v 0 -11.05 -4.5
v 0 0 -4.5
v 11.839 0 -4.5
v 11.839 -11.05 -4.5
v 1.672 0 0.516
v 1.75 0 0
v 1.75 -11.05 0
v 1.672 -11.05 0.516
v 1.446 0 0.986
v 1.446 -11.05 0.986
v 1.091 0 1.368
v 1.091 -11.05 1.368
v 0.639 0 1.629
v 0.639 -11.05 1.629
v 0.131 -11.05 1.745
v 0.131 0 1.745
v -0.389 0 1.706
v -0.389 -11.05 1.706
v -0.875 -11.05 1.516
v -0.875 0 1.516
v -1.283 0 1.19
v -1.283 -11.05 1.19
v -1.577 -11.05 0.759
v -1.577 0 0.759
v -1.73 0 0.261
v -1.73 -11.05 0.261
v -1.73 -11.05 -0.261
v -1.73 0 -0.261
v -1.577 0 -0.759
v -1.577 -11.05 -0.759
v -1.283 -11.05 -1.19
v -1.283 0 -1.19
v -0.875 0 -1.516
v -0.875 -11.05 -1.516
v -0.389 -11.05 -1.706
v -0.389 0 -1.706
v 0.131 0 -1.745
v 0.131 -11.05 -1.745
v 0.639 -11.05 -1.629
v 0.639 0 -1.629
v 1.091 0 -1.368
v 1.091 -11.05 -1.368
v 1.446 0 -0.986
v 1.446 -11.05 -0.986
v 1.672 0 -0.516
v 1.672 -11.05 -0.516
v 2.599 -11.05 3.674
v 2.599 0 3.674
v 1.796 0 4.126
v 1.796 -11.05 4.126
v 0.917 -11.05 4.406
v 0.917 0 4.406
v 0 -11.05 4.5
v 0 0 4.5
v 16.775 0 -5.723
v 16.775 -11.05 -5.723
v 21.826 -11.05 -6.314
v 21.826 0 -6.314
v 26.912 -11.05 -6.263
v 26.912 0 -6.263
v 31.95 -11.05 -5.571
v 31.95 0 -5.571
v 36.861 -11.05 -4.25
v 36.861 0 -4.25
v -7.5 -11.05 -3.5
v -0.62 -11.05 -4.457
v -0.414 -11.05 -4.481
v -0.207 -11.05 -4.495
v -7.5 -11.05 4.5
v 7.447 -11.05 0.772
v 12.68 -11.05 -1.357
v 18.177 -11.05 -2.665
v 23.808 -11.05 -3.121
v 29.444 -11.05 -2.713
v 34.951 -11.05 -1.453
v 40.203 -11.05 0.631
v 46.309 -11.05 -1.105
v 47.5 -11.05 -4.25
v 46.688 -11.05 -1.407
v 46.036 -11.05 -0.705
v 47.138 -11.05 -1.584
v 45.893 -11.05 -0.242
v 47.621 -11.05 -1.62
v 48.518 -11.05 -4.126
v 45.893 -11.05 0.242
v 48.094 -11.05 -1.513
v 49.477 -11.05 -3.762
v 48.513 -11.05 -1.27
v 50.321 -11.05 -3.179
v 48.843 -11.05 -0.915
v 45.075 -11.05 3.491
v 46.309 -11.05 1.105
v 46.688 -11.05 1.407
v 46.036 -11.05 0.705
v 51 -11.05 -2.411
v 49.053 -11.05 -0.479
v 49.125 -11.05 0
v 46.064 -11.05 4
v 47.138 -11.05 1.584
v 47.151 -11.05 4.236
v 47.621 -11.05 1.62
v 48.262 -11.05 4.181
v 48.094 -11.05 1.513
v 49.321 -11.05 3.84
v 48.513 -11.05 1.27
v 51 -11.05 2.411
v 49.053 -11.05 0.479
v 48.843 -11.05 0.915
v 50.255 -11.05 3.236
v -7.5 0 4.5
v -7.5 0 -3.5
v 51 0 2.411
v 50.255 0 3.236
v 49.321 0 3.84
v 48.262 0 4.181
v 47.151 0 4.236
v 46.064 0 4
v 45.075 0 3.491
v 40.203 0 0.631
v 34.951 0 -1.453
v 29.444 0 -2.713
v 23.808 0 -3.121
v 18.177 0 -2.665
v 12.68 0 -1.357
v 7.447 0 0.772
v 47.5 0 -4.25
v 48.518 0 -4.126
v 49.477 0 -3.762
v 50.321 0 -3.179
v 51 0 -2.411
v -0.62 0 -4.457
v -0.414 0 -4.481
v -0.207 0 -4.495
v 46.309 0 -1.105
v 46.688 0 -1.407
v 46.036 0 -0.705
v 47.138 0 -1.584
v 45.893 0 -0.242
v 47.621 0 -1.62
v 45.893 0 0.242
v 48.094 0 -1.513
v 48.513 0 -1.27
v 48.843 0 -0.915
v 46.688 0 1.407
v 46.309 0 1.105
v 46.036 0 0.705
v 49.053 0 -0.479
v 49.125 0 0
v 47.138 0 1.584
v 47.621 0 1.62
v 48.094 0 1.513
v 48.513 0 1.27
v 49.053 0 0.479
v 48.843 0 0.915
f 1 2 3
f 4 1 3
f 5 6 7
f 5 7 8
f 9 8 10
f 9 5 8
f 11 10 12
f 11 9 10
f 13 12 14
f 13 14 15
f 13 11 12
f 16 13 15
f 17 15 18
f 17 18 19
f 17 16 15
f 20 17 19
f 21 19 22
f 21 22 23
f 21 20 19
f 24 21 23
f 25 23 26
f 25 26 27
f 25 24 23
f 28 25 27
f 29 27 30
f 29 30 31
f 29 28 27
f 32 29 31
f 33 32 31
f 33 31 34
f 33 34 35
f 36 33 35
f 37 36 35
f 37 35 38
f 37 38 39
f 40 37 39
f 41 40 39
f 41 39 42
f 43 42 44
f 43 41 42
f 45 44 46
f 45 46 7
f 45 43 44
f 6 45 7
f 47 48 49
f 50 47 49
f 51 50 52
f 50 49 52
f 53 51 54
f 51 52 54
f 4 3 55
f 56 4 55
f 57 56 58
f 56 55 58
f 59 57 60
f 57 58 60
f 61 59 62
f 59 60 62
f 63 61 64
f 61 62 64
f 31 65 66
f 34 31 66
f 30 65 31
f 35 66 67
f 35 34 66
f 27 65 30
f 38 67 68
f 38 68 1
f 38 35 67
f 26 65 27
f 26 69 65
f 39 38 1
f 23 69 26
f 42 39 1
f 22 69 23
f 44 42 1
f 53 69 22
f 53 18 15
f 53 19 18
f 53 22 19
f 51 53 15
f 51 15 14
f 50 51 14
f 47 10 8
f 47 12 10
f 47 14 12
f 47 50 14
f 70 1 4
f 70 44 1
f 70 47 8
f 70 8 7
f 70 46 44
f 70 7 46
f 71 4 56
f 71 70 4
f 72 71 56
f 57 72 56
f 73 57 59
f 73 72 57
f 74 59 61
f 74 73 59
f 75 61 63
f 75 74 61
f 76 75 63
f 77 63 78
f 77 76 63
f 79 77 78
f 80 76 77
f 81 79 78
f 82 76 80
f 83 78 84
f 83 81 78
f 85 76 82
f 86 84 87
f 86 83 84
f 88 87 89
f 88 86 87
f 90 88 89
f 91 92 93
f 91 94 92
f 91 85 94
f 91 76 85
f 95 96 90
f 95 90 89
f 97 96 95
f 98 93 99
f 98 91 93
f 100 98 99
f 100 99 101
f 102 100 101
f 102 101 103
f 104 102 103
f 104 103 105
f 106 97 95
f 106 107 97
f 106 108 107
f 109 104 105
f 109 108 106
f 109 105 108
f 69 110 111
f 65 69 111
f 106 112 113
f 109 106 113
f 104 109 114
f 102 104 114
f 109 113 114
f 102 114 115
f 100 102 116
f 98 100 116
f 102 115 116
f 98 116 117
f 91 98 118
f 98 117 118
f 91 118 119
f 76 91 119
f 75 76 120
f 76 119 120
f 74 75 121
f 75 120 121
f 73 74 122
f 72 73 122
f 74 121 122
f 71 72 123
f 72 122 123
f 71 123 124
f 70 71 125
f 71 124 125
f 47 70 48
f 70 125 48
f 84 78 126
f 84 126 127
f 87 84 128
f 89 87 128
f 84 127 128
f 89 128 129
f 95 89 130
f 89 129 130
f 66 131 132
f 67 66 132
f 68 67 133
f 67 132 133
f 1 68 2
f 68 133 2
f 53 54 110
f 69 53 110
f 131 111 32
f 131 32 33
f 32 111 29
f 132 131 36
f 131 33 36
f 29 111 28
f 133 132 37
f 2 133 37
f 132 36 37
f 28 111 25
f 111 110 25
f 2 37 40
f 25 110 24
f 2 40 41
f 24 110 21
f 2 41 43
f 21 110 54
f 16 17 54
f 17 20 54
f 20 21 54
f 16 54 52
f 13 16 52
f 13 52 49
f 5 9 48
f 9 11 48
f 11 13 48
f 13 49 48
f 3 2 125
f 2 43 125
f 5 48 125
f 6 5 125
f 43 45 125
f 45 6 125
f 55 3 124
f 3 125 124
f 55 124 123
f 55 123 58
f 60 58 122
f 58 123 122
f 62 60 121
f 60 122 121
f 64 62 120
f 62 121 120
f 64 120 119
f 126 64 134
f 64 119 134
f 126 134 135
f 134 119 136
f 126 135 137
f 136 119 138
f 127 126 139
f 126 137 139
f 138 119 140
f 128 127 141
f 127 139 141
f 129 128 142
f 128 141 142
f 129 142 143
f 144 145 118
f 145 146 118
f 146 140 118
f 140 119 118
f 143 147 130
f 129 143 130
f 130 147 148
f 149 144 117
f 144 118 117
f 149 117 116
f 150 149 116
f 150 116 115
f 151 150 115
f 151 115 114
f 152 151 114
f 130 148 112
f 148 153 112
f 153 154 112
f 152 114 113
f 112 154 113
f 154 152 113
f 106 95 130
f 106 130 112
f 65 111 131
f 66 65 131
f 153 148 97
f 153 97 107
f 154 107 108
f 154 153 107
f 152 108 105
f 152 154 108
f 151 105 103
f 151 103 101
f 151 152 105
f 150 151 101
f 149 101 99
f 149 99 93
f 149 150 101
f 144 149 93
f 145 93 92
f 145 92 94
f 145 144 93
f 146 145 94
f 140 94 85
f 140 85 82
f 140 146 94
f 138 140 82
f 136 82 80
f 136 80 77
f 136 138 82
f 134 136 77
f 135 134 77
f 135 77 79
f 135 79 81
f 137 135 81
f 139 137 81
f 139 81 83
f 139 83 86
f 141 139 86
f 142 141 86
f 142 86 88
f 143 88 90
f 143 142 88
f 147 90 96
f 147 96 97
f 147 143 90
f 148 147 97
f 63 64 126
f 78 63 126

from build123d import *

# Parameters (mm, degrees)
F0_R     = 1.75
F0_R_2   = 1.625
F1_DEPTH = 11.05


with BuildPart() as f1:
    # F0 (on Front) → F1 (new body)
    with BuildSketch(Plane.XZ):
        with BuildLine():
            Line((-7.5, -3.5), (-0.620029, -4.45708))
            ThreePointArc((-0.620029, -4.45708), (-0.310756, -4.489257), (0, -4.5))
            Line((0, -4.5), (11.839124, -4.5))
            ThreePointArc((11.839124, -4.5), (24.369894, -6.368848), (36.860822, -4.25))
            Line((36.860822, -4.25), (47.5, -4.25))
            ThreePointArc((47.5, -4.25), (49.476882, -3.762239), (51, -2.410913))
            Line((51, -2.410913), (51, 2.410913))
            ThreePointArc((51, 2.410913), (48.261956, 4.181139), (45.075467, 3.490578))
            ThreePointArc((45.075467, 3.490578), (23.808304, -3.120513), (2.598914, 3.673642))
            ThreePointArc((2.598914, 3.673642), (1.363564, 4.288437), (0, 4.5))
            Line((0, 4.5), (-7.5, 4.5))
            Line((-7.5, 4.5), (-7.5, -3.5))
        make_face()
        Circle(F0_R, mode=Mode.SUBTRACT)
        with Locations((47.5, 0)):
            Circle(F0_R_2, mode=Mode.SUBTRACT)
    extrude(amount=F1_DEPTH)


solid = f1.part
